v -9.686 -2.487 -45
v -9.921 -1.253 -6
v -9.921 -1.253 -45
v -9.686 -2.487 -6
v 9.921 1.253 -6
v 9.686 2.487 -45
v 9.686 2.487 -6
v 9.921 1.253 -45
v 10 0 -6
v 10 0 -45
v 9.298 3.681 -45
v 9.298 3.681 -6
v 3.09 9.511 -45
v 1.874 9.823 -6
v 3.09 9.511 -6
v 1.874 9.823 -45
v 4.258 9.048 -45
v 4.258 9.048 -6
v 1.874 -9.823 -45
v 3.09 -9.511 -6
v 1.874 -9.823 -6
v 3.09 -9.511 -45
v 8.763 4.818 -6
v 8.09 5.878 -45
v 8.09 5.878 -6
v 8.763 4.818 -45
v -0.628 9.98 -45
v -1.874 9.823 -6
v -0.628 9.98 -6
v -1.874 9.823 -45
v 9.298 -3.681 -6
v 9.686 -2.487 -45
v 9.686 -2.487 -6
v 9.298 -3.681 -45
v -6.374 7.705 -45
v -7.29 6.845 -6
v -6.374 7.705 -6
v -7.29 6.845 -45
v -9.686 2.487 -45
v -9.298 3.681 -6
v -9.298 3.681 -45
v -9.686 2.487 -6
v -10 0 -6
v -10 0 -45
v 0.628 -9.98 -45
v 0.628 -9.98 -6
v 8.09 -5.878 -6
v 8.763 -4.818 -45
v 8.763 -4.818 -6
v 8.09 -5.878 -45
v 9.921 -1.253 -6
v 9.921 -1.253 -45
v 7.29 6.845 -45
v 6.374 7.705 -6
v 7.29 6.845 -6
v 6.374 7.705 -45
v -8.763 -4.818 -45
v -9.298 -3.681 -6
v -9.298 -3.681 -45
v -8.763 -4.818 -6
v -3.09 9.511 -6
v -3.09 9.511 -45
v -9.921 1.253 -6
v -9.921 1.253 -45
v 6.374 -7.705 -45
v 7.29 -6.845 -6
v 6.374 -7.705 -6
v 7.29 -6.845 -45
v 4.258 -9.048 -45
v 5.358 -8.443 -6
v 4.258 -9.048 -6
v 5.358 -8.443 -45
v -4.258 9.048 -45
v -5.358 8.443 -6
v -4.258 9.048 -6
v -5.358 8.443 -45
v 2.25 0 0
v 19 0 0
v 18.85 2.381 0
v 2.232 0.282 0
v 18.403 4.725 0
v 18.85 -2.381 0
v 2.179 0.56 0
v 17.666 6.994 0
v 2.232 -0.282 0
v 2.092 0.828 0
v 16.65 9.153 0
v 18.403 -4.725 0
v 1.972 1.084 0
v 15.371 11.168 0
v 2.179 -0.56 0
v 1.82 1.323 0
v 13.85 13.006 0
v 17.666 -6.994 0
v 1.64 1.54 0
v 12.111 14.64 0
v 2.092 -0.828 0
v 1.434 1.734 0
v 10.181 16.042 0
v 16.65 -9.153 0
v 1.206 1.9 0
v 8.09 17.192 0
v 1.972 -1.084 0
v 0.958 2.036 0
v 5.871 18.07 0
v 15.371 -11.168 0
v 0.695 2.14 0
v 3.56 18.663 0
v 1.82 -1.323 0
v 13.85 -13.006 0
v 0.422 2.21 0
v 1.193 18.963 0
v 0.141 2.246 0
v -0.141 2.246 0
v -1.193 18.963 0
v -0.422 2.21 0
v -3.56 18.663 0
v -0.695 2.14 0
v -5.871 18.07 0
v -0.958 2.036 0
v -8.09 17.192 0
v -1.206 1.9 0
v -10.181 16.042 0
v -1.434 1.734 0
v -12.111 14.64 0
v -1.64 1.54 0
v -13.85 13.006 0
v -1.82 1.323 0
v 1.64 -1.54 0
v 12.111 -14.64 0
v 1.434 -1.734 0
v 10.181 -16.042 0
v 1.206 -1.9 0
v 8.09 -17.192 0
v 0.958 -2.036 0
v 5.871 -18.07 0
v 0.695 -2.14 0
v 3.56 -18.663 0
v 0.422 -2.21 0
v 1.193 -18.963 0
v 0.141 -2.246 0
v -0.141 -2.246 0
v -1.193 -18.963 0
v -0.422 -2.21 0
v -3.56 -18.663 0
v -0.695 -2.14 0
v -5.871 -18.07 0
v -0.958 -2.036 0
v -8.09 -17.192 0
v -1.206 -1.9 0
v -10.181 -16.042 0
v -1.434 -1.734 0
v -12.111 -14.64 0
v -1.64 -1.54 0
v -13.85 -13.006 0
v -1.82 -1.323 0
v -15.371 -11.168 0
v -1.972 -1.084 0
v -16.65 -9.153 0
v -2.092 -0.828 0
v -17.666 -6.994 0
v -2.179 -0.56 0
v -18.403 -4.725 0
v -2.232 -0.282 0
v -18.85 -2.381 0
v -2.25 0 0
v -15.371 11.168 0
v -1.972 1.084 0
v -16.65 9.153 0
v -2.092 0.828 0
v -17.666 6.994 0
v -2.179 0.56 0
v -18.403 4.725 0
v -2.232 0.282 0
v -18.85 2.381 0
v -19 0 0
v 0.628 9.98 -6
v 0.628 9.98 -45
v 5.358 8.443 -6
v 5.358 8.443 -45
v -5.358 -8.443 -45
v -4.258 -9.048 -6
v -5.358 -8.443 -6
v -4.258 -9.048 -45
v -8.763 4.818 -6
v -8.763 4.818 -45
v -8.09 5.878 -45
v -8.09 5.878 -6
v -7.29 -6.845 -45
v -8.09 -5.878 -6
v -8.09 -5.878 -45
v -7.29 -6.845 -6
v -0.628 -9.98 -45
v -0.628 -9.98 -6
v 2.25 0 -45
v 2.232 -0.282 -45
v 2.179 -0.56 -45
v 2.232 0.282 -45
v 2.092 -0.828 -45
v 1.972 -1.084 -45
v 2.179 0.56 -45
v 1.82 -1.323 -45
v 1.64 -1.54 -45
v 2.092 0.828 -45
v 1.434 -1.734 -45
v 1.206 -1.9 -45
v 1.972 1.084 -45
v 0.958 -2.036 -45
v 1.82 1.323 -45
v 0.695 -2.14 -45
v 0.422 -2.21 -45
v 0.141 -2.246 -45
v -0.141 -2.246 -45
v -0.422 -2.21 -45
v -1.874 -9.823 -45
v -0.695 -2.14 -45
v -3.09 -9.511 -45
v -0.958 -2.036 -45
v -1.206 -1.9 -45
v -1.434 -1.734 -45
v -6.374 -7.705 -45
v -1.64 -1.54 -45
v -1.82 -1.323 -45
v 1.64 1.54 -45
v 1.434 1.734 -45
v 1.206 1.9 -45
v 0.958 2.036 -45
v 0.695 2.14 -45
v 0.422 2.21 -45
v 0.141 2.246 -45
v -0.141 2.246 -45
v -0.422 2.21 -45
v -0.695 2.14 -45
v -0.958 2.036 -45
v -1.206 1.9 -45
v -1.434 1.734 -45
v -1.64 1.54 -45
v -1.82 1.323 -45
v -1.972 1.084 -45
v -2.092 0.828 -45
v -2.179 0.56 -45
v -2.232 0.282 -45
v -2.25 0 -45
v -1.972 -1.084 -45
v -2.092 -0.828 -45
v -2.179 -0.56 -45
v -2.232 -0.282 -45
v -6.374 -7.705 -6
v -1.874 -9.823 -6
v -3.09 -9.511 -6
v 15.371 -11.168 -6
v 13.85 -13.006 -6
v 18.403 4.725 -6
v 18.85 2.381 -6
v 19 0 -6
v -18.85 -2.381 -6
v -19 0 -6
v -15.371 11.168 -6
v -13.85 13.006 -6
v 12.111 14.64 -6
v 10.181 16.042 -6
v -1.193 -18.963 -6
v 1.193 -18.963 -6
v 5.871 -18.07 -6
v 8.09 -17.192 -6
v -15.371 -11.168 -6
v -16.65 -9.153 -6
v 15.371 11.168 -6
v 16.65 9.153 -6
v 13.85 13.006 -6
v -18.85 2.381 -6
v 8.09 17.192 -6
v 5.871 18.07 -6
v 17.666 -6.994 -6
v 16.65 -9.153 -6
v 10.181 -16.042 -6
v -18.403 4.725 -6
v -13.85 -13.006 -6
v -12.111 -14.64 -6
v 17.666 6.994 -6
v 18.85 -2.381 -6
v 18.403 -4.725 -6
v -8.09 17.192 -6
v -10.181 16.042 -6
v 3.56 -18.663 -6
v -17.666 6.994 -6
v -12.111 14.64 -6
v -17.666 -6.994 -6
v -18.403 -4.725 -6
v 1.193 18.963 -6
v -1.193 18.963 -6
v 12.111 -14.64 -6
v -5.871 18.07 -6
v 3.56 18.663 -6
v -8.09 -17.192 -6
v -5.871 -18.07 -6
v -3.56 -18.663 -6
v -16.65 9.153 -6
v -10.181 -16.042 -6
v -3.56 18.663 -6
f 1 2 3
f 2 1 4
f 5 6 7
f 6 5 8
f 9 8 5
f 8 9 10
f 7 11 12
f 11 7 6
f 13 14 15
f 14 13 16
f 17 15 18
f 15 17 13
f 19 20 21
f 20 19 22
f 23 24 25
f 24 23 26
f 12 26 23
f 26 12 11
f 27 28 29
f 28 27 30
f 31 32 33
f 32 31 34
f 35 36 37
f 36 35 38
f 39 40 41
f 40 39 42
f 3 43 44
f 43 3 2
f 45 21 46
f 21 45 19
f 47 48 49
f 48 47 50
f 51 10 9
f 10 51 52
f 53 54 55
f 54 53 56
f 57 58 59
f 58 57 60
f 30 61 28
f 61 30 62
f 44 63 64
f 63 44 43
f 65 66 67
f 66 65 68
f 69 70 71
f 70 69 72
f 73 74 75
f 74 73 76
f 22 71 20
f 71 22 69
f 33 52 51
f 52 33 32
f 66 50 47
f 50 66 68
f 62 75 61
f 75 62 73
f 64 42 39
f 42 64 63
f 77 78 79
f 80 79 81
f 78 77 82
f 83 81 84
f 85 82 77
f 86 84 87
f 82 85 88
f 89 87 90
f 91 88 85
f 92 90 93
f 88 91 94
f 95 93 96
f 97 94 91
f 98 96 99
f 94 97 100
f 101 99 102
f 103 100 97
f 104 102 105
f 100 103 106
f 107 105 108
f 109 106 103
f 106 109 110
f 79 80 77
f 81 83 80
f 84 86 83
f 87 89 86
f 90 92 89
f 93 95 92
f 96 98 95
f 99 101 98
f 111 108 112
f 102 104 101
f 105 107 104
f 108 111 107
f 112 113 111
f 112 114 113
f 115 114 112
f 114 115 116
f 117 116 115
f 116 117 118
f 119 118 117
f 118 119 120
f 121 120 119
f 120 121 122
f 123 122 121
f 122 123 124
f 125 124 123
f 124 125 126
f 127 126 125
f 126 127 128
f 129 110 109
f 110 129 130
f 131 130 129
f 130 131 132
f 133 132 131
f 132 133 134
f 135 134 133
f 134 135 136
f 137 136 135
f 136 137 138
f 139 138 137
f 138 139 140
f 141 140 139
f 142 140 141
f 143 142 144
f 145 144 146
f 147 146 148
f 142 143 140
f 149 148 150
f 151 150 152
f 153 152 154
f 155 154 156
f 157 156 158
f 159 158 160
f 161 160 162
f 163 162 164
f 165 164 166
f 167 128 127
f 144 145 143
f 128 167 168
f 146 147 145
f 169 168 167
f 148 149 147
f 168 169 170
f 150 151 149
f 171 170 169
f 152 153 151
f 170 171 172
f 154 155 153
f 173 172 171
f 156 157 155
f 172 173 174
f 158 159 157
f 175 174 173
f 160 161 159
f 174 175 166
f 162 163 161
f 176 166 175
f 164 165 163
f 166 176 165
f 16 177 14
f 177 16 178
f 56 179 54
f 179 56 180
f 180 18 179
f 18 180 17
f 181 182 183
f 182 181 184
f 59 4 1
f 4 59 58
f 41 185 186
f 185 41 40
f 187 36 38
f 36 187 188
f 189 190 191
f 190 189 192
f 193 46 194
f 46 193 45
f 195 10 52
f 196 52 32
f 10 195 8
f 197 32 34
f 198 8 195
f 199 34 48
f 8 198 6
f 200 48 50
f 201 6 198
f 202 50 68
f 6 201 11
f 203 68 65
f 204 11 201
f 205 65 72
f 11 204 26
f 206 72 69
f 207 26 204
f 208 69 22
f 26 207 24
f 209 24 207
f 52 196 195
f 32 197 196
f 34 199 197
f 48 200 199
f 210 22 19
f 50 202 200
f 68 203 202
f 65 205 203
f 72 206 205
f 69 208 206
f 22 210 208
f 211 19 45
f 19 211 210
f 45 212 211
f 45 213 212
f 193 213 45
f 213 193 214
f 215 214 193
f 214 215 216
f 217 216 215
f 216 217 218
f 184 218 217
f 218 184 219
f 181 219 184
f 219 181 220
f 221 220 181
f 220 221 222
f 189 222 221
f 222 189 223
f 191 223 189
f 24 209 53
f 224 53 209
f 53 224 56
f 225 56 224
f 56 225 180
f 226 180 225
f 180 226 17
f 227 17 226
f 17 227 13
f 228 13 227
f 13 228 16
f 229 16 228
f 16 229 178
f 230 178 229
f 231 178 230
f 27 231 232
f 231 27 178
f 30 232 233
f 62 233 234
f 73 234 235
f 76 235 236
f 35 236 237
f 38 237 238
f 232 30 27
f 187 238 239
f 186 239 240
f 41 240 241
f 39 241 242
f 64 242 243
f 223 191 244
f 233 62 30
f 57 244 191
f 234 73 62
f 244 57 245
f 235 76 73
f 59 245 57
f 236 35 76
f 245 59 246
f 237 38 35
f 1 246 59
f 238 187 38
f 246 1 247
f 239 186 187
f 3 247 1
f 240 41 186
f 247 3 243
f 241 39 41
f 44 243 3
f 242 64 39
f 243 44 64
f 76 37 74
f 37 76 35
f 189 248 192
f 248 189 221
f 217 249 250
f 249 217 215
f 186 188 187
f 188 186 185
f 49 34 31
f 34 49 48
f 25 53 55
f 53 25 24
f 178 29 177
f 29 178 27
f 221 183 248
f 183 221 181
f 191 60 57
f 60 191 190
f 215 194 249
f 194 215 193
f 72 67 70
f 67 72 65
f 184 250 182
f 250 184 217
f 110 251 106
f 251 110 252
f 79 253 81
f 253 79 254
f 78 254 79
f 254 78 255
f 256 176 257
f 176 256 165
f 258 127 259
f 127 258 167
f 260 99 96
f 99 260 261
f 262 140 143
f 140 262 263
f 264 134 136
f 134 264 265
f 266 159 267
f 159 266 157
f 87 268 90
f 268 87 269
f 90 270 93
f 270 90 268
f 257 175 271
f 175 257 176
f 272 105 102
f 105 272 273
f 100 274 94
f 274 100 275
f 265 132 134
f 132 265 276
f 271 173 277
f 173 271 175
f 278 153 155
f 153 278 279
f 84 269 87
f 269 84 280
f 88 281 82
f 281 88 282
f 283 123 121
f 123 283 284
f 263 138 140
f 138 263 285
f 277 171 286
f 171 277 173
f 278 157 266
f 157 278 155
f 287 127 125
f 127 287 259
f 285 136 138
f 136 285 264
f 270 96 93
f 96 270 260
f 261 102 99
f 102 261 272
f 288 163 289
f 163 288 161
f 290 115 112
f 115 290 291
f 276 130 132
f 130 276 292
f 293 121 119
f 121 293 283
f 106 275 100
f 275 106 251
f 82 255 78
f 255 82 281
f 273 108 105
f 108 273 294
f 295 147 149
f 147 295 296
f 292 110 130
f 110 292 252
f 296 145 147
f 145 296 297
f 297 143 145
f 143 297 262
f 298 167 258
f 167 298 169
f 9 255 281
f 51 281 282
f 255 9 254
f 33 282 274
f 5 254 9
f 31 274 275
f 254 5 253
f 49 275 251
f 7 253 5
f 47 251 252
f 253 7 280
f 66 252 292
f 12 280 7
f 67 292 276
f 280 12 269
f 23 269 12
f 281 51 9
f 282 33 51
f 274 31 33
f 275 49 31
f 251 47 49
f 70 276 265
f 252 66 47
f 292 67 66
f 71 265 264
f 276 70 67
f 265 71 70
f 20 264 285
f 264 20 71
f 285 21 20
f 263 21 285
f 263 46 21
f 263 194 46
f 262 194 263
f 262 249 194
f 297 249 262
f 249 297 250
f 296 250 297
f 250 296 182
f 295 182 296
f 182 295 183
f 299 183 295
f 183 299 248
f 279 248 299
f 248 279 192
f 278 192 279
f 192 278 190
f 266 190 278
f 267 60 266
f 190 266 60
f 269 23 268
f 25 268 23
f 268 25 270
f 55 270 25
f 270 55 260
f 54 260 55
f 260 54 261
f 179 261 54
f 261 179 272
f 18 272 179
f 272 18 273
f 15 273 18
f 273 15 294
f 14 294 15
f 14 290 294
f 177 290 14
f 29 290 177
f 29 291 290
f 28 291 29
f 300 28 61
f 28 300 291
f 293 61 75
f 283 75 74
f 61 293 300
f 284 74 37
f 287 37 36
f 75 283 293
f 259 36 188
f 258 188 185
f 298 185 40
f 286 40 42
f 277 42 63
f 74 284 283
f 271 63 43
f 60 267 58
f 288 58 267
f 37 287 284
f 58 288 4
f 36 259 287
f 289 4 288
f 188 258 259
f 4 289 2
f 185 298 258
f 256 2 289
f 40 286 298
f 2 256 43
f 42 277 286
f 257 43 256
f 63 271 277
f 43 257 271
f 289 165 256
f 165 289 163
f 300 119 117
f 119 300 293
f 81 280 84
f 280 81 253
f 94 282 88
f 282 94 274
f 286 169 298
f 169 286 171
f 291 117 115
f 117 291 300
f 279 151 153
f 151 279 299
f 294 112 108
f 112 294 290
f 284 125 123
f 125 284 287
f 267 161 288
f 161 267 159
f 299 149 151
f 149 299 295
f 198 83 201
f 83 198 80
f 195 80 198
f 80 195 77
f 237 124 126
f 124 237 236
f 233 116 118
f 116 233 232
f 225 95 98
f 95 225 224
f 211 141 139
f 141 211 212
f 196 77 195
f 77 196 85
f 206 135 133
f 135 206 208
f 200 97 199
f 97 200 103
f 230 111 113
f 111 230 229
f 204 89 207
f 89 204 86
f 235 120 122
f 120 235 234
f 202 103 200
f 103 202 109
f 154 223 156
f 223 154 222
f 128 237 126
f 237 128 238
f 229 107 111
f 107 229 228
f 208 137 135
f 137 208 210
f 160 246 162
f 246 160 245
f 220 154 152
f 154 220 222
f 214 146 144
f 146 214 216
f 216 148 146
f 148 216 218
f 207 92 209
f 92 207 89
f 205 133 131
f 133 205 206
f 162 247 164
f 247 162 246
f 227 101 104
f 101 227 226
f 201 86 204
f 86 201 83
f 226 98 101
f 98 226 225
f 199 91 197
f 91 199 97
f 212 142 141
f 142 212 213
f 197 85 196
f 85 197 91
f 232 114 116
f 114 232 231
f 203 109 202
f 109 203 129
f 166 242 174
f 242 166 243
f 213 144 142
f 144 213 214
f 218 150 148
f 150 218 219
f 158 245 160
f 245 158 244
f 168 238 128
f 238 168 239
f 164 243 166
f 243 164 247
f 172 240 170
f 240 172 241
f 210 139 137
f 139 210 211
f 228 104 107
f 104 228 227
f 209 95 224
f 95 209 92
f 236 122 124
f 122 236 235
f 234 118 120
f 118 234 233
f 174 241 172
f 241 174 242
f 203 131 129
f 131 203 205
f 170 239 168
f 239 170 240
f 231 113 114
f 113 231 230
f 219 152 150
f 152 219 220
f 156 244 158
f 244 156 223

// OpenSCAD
$fn = 50;


difference() {
	union() {
		translate(v = [0, 0, -45.0000000000]) {
			cylinder(h = 45, r = 10.0000000000);
		}
		translate(v = [0, 0, -6.0000000000]) {
			cylinder(h = 6, r = 19.0000000000);
		}
	}
	union() {
		#translate(v = [0, 0, -45]) {
			cylinder(h = 45, r = 2.2500000000);
		}
	}
}
